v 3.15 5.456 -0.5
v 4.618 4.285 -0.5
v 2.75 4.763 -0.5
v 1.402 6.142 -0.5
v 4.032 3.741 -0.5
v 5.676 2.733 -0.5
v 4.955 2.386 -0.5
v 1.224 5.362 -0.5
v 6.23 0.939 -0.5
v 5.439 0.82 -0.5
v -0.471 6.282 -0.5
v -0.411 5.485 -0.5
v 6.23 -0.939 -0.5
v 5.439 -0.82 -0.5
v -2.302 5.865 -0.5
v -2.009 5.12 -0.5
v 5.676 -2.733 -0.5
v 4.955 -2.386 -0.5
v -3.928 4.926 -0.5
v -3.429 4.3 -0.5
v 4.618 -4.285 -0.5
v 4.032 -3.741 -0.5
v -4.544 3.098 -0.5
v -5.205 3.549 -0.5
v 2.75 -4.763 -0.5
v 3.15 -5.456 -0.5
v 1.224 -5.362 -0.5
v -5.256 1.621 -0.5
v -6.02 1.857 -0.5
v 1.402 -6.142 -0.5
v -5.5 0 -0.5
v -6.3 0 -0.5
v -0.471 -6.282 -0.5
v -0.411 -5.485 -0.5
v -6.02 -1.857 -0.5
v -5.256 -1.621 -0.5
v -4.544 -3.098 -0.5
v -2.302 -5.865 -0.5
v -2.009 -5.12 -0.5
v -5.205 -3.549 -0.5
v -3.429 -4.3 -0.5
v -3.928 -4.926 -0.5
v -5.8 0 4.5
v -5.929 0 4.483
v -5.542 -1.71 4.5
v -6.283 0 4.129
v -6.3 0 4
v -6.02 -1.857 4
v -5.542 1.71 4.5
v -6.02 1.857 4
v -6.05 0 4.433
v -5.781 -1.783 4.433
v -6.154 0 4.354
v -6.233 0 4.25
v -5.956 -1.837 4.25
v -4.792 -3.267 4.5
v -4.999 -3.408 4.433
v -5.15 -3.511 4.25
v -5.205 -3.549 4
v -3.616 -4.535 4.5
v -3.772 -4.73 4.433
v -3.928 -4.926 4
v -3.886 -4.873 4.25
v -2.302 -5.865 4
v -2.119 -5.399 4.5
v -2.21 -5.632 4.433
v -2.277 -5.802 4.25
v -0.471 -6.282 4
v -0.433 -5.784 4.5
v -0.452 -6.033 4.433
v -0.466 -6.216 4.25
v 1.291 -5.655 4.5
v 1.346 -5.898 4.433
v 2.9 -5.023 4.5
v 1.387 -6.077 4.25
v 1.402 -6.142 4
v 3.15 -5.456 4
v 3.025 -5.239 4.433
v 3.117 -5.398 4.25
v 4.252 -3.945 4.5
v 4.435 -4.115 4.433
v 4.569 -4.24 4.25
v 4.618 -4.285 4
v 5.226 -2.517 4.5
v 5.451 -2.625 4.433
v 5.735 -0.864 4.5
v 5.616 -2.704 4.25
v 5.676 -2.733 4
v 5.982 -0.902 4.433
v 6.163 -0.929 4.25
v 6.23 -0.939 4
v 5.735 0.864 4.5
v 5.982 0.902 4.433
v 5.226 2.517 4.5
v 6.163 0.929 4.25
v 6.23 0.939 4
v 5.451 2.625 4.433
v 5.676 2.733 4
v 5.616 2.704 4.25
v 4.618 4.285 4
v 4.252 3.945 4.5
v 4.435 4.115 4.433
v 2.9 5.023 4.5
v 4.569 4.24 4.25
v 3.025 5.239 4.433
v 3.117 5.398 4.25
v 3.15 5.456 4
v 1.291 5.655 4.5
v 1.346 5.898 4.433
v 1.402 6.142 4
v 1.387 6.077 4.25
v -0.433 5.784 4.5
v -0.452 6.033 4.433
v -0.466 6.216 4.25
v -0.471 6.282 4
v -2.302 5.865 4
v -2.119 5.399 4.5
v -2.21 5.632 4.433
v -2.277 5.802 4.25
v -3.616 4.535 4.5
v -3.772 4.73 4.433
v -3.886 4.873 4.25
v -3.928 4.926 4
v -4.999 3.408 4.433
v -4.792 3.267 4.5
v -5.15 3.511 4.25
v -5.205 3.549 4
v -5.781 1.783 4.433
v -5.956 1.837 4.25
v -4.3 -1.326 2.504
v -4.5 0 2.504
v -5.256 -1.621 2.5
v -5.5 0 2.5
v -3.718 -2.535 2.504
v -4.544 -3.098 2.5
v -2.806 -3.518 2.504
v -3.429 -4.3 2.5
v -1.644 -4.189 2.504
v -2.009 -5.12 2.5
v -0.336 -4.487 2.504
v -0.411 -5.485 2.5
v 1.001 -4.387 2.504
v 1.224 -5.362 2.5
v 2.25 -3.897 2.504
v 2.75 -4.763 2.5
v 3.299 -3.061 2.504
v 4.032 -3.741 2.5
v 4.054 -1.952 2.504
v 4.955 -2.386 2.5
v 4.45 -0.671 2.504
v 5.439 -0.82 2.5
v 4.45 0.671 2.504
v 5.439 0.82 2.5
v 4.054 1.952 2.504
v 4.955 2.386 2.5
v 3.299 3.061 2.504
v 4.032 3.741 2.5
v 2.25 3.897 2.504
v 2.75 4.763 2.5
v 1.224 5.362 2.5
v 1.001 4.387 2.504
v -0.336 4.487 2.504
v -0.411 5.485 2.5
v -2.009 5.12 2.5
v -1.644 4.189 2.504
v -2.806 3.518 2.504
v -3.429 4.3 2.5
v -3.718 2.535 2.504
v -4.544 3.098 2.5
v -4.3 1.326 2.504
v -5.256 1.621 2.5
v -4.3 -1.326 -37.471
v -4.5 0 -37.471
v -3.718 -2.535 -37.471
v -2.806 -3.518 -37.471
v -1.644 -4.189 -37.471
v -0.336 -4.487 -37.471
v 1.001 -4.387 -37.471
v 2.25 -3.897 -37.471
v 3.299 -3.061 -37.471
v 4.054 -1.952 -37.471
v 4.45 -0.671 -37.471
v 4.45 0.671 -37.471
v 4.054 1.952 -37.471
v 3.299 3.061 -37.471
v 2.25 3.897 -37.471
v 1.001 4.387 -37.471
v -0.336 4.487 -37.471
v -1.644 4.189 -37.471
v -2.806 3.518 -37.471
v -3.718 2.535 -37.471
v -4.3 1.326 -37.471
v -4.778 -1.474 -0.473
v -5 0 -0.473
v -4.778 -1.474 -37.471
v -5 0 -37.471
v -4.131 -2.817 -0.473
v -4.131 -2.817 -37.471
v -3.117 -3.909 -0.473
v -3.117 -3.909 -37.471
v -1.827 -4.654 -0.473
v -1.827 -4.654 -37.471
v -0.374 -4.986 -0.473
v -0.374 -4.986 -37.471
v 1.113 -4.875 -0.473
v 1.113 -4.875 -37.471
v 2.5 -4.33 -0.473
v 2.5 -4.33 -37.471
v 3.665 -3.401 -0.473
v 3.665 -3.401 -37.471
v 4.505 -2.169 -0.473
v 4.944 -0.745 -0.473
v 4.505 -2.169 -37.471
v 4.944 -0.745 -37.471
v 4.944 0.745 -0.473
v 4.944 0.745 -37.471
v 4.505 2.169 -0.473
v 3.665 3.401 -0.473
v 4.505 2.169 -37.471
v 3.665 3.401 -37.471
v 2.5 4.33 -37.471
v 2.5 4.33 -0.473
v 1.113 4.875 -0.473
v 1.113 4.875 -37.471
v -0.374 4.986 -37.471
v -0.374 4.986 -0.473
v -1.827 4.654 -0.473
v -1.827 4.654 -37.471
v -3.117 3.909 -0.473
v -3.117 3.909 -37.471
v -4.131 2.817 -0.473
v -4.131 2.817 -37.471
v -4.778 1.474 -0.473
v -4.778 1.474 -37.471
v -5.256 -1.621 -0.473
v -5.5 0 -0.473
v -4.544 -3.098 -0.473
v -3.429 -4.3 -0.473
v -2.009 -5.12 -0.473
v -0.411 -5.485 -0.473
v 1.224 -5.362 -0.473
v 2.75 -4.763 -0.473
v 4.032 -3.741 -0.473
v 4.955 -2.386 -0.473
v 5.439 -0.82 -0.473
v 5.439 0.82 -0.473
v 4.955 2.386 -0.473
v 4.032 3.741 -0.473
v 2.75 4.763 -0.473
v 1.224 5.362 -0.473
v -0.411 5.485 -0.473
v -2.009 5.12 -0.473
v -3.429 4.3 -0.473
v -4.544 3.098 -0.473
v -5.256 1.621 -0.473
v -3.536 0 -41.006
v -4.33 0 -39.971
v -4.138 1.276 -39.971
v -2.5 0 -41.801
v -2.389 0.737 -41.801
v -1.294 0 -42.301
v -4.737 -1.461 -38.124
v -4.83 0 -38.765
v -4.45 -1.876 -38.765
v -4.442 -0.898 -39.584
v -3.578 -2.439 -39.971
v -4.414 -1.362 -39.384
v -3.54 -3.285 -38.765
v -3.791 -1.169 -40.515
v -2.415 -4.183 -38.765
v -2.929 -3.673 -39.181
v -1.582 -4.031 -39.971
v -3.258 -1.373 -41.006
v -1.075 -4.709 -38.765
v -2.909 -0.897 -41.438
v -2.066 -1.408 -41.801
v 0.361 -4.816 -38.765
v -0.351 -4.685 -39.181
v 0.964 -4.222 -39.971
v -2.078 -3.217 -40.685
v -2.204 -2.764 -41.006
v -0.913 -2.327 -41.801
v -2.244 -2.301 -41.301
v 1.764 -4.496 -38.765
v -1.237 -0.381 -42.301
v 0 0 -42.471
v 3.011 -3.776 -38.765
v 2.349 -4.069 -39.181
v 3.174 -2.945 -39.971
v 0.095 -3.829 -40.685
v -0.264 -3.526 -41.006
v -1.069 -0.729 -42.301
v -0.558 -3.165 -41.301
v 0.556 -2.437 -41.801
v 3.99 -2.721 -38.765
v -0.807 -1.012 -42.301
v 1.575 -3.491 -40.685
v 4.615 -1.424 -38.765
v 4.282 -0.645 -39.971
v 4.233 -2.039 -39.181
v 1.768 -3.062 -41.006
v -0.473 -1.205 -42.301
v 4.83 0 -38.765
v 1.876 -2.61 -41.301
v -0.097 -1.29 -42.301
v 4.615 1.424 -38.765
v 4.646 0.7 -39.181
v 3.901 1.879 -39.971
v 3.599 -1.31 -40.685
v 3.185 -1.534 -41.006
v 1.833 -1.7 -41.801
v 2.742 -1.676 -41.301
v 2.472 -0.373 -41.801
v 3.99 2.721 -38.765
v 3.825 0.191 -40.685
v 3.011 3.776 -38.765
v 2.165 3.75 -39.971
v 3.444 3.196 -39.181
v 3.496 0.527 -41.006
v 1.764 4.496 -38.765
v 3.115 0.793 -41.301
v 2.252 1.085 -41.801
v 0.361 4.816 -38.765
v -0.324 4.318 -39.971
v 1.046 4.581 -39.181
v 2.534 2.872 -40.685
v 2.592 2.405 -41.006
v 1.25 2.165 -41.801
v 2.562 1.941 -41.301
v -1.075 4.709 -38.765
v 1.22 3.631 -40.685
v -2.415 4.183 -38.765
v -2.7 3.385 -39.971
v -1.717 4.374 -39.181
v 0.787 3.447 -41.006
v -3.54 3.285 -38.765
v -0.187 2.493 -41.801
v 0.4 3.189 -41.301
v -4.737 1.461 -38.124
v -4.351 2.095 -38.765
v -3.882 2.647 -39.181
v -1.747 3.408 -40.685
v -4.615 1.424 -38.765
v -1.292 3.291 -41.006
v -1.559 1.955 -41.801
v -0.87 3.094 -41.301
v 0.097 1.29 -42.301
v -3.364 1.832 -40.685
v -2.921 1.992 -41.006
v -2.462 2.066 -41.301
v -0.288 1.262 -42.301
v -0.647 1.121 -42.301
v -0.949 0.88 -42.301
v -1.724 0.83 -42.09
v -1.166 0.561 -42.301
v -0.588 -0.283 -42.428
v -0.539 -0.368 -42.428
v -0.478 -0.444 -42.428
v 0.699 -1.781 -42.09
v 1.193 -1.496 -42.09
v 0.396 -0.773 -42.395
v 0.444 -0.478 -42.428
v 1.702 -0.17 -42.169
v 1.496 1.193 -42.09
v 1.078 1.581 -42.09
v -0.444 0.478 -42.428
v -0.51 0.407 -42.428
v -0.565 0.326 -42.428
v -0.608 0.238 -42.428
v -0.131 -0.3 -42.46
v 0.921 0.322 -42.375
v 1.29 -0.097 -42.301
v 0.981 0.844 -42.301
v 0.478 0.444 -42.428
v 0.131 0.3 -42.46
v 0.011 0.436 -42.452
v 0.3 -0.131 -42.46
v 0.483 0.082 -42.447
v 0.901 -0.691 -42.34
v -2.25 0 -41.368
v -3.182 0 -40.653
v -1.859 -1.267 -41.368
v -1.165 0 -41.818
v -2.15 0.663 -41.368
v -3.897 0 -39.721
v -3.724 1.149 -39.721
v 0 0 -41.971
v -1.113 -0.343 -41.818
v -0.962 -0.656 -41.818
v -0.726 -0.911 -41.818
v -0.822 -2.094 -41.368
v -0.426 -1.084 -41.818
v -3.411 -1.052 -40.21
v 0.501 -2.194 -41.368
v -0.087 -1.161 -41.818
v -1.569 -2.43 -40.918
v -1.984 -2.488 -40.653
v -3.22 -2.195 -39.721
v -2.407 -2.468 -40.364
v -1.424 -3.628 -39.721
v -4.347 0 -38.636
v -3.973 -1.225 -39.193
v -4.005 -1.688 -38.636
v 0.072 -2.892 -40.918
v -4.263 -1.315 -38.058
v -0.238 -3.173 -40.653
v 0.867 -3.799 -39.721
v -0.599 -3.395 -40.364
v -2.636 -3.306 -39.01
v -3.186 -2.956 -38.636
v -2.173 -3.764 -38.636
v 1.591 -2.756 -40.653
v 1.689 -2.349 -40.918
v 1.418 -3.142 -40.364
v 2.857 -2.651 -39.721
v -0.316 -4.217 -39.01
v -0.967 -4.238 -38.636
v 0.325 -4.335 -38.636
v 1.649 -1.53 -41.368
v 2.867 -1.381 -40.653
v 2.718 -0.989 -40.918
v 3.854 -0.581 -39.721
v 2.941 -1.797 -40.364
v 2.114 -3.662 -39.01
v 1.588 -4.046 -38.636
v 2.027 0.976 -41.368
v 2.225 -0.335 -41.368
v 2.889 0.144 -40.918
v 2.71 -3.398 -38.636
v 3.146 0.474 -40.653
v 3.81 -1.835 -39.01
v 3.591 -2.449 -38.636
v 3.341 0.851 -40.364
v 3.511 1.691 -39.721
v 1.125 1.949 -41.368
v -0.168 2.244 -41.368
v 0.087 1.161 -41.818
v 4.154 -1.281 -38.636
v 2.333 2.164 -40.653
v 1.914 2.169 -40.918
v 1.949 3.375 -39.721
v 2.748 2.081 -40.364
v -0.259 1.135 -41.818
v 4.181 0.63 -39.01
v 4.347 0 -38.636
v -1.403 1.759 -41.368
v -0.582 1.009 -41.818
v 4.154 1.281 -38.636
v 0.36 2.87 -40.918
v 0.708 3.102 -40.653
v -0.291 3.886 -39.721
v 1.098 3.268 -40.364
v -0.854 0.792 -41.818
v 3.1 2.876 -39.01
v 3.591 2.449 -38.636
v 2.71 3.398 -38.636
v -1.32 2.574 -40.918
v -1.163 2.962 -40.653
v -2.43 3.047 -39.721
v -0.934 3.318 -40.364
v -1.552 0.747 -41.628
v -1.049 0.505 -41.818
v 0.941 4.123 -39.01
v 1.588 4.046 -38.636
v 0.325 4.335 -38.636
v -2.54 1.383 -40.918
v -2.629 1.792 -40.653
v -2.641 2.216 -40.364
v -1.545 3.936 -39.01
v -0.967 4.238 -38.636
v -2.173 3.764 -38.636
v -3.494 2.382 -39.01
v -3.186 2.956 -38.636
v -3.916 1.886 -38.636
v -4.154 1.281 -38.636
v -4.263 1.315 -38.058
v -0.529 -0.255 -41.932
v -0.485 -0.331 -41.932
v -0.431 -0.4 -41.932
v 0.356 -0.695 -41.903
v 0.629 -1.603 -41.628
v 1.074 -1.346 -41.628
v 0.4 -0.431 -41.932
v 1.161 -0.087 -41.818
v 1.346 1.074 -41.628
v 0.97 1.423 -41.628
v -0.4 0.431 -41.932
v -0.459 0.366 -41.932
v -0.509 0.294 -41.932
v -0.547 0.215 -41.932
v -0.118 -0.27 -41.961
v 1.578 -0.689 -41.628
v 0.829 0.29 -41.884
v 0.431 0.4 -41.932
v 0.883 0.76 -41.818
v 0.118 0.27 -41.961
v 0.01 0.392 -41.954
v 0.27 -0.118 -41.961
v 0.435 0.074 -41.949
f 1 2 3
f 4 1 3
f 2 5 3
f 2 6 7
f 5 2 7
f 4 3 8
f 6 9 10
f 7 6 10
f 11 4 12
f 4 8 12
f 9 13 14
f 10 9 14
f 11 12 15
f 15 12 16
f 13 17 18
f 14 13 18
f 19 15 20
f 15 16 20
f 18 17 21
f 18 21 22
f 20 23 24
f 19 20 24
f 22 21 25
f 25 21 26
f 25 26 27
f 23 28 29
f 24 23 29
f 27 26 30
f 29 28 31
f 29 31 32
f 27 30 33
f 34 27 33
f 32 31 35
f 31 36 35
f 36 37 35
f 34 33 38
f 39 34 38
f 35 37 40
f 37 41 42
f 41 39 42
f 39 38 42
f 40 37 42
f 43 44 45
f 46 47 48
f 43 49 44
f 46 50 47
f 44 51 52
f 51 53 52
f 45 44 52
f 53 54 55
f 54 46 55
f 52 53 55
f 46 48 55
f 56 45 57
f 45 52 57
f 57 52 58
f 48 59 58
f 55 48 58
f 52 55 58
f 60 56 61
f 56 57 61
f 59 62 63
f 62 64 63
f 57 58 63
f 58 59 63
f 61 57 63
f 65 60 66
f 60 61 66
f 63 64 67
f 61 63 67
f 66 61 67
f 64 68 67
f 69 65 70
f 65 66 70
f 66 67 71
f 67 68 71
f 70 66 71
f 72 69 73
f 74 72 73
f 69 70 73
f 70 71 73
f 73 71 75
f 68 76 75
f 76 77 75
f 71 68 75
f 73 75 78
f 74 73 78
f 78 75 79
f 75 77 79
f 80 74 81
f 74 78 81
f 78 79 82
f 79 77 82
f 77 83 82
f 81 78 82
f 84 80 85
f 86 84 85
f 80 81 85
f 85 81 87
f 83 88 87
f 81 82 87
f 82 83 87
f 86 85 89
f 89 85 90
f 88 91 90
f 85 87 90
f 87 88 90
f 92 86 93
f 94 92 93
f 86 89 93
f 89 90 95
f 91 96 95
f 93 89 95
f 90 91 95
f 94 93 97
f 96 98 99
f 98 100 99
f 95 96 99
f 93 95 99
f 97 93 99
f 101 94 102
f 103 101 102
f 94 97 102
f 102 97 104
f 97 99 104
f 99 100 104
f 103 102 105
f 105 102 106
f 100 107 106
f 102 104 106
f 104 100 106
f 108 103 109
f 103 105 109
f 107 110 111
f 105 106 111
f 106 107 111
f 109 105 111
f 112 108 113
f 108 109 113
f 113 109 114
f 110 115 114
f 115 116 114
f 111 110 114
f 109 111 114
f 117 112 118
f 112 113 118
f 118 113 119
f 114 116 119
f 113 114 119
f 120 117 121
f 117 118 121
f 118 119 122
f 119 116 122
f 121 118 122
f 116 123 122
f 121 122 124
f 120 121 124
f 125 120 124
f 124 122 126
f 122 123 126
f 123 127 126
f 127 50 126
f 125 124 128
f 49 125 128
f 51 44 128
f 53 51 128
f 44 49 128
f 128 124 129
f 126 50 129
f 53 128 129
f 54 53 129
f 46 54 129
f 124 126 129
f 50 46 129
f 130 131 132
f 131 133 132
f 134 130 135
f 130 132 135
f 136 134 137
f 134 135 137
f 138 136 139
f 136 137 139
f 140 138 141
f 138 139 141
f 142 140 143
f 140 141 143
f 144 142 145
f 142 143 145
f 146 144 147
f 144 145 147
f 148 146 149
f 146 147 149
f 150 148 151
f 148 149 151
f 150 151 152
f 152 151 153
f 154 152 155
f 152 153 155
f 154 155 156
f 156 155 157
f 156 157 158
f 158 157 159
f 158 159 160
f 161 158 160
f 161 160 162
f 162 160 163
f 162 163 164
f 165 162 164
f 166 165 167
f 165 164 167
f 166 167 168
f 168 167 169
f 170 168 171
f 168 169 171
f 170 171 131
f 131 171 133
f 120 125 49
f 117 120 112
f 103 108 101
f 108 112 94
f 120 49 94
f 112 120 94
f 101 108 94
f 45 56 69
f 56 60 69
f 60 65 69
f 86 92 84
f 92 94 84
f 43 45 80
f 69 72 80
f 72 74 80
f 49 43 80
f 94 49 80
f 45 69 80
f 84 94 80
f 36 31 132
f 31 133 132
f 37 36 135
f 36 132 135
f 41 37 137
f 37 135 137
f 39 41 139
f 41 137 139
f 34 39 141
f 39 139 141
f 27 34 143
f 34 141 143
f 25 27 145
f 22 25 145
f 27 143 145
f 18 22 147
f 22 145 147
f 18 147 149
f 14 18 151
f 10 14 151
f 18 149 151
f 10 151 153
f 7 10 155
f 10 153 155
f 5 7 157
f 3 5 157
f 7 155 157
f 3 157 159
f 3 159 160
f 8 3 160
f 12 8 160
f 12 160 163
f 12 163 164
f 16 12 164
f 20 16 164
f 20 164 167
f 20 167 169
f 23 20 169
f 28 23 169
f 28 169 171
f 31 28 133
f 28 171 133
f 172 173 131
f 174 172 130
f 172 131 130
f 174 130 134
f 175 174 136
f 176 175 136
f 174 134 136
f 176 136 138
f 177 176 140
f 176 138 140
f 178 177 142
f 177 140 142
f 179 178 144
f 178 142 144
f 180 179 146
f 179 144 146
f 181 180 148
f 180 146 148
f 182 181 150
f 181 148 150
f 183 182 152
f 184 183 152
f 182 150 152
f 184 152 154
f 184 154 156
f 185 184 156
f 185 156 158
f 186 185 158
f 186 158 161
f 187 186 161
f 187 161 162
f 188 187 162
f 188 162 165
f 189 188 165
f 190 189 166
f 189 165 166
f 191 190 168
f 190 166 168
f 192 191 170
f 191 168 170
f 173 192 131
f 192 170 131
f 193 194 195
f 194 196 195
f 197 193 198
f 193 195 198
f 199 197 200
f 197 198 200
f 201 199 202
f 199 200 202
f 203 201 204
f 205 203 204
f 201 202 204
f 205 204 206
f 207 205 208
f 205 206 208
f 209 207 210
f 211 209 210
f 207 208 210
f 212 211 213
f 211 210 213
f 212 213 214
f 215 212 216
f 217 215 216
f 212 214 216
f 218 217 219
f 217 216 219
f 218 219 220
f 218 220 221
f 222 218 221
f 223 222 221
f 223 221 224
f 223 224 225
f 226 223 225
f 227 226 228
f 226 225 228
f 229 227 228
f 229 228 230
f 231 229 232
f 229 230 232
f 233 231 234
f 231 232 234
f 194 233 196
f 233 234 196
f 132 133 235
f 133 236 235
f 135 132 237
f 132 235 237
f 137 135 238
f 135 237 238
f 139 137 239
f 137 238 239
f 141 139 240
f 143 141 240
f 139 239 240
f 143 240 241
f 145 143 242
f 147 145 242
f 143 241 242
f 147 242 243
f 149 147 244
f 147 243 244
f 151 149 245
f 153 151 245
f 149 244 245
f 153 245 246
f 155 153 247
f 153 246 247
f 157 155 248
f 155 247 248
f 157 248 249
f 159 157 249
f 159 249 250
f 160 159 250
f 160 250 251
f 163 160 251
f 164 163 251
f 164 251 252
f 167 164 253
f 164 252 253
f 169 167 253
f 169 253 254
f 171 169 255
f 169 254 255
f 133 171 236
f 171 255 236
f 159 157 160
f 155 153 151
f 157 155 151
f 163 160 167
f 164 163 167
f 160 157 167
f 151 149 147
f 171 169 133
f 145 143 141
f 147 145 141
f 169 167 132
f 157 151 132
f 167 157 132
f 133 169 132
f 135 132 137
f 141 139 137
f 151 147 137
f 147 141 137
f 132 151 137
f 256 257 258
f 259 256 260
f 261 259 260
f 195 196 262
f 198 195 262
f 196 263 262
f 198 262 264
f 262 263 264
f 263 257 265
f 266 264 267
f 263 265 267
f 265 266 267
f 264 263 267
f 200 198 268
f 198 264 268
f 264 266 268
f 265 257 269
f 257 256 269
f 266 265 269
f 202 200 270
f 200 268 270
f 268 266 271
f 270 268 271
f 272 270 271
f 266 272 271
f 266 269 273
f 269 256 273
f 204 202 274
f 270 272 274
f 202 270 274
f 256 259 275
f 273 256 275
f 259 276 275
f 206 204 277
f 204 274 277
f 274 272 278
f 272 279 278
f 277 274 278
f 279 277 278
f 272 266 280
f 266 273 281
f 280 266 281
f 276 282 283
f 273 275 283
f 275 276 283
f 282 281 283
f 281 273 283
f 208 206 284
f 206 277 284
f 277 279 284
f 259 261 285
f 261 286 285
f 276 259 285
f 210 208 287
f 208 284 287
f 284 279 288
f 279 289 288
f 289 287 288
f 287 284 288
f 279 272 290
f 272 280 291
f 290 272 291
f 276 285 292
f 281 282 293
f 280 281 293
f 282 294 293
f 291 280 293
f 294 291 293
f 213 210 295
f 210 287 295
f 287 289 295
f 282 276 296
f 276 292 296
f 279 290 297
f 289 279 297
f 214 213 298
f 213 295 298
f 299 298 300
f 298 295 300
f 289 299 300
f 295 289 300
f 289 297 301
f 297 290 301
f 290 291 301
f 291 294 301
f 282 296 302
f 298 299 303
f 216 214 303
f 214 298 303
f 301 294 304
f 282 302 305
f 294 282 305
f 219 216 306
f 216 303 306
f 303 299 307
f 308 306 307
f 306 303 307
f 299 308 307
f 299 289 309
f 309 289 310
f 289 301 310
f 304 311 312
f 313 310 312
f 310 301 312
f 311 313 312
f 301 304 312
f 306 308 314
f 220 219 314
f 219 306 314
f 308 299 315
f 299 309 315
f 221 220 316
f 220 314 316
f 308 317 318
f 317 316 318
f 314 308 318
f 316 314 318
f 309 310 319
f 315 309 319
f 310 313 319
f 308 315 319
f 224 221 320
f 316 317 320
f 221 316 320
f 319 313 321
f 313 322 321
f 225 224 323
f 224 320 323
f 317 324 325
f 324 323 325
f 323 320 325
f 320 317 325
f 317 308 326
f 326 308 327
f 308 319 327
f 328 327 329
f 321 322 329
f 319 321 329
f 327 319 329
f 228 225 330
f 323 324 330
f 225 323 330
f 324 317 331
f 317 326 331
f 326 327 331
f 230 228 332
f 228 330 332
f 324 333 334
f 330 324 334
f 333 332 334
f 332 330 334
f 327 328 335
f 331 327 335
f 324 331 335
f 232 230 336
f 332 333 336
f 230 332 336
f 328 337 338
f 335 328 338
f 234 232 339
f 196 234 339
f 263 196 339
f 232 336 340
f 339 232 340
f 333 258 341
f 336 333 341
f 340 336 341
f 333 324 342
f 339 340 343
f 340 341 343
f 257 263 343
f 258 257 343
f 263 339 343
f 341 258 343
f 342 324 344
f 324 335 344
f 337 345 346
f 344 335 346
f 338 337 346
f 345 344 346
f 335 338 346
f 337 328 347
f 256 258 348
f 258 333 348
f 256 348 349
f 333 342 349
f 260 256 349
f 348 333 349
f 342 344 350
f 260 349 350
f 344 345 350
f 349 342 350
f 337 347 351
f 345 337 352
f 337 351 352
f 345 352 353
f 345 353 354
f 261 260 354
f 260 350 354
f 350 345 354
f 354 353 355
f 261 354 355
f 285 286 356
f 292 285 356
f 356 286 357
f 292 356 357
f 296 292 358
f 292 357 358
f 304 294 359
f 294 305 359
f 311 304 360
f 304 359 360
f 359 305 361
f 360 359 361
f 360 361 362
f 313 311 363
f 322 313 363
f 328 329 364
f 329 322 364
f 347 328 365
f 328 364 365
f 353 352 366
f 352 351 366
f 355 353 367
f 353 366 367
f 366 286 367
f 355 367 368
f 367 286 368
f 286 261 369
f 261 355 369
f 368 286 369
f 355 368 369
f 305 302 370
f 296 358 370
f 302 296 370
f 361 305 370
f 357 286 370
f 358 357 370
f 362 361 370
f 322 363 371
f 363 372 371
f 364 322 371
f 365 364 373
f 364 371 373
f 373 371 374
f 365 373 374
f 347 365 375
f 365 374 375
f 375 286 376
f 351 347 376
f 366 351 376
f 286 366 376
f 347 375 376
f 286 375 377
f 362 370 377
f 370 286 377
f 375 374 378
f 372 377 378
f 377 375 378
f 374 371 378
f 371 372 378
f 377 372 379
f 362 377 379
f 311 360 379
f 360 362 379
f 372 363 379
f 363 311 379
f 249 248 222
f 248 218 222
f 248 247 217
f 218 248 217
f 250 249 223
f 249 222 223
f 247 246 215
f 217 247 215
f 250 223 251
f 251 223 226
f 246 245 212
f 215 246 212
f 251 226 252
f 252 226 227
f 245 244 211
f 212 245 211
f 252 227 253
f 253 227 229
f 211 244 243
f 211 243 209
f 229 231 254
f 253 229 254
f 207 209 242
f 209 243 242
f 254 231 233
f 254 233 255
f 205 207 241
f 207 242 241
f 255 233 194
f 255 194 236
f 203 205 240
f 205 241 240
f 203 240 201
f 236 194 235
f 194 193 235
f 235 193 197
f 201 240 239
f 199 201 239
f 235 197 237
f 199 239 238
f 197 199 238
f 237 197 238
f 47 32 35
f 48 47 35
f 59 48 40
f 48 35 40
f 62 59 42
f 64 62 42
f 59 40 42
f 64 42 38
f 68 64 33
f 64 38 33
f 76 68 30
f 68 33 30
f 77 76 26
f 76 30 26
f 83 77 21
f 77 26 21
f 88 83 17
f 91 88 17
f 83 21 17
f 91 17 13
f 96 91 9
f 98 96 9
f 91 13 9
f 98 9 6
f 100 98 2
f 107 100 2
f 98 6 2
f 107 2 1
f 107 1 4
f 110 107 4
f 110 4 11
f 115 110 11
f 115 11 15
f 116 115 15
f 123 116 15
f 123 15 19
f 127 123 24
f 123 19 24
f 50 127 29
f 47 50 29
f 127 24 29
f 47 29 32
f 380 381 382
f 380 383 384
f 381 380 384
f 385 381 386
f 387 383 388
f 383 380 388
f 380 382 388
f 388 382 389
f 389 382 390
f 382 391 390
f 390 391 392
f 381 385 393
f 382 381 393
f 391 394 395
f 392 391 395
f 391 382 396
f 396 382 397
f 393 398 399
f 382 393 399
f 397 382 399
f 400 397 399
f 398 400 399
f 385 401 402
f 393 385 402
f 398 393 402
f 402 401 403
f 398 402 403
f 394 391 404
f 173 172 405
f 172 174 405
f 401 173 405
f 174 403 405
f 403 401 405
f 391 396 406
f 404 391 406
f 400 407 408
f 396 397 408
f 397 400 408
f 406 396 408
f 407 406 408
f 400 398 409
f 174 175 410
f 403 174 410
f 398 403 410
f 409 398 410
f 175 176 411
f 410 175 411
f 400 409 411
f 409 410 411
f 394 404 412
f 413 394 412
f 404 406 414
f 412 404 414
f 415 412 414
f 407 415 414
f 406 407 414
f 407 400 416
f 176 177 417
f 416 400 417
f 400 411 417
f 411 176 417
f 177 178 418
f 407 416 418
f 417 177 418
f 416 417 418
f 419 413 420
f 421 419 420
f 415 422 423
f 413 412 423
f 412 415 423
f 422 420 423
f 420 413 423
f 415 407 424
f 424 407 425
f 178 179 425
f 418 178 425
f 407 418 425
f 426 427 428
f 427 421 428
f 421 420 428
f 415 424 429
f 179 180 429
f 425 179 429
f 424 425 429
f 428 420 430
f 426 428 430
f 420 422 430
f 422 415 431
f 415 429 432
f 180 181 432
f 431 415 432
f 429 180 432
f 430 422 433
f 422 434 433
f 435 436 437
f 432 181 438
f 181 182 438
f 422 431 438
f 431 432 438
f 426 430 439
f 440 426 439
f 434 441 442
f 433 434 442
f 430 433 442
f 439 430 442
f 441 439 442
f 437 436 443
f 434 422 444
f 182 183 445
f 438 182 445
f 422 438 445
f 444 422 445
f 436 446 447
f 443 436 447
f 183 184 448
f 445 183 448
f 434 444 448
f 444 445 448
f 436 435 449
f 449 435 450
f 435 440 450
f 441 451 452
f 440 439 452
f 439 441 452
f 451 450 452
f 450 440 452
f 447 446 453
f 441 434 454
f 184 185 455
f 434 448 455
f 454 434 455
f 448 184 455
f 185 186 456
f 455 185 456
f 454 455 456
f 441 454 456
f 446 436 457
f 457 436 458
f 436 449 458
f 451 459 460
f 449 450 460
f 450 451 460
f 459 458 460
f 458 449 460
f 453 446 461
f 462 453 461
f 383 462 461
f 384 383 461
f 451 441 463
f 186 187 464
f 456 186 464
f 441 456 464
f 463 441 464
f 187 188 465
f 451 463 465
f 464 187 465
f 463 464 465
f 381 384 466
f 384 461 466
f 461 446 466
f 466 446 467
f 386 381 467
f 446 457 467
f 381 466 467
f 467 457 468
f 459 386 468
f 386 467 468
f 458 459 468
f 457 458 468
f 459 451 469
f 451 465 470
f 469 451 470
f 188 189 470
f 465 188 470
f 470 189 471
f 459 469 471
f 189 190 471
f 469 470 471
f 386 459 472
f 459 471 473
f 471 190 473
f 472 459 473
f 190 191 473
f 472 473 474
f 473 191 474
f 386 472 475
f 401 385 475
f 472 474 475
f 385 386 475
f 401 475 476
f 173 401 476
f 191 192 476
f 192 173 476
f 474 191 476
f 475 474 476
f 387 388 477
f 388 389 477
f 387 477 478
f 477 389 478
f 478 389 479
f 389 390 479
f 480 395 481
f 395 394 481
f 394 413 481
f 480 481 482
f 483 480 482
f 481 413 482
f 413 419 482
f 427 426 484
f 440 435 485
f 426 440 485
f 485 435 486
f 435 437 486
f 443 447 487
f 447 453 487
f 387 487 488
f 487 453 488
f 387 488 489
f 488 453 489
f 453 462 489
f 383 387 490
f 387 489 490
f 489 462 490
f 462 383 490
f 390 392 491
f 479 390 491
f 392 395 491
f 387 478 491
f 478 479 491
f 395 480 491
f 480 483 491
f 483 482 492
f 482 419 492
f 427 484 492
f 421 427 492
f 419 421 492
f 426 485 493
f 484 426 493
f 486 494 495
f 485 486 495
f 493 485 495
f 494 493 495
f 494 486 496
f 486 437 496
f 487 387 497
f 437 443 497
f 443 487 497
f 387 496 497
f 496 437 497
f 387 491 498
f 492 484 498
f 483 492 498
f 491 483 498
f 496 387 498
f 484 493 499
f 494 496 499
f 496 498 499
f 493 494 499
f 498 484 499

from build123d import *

# Parameters (mm, degrees)
F4_R = 0.5


with BuildPart() as f1:
    # F0 (on Front) → F1 (revolve)
    with BuildSketch(Plane.XZ):
        with BuildLine():
            Line((-5.5, -0.472584), (-5, -0.472584))
            Line((-5, -0.472584), (-5, -37.470958))
            ThreePointArc((-5, -37.470958), (-3.535534, -41.006492), (0, -42.470958))
            Line((0, -42.470958), (0, -41.970958))
            ThreePointArc((0, -41.970958), (-3.181981, -40.652939), (-4.5, -37.470958))
            Line((-4.5, -37.470958), (-4.5, 2.504139))
            Line((-4.5, 2.504139), (-5.5, 2.5))
            Line((-5.5, 2.5), (-5.5, 0))
            Line((-5.5, 0), (-5.5, -0.472584))
        make_face()
    revolve(axis=Axis((0, 0, -13.258269), (0, 0, 1)))


with BuildPart() as f3:
    # F2 (on Front) → F3 (revolve)
    with BuildSketch(Plane.XZ):
        Polygon((0, 2.5), (0, 4.5), (-6.3, 4.5), (-6.3, -0.5), (-5.5, -0.5), (-5.5, 2.5), align=None)
    revolve(axis=Axis((0, 0, 2.100606), (0, 0, 1)))

    # F4
    f4_edges = [f3.edges().sort_by_distance(p)[0] for p in [
        (6.3, 0, 4.5),
    ]]
    fillet(f4_edges, radius=F4_R)


solid = Compound([f1.part, f3.part])
